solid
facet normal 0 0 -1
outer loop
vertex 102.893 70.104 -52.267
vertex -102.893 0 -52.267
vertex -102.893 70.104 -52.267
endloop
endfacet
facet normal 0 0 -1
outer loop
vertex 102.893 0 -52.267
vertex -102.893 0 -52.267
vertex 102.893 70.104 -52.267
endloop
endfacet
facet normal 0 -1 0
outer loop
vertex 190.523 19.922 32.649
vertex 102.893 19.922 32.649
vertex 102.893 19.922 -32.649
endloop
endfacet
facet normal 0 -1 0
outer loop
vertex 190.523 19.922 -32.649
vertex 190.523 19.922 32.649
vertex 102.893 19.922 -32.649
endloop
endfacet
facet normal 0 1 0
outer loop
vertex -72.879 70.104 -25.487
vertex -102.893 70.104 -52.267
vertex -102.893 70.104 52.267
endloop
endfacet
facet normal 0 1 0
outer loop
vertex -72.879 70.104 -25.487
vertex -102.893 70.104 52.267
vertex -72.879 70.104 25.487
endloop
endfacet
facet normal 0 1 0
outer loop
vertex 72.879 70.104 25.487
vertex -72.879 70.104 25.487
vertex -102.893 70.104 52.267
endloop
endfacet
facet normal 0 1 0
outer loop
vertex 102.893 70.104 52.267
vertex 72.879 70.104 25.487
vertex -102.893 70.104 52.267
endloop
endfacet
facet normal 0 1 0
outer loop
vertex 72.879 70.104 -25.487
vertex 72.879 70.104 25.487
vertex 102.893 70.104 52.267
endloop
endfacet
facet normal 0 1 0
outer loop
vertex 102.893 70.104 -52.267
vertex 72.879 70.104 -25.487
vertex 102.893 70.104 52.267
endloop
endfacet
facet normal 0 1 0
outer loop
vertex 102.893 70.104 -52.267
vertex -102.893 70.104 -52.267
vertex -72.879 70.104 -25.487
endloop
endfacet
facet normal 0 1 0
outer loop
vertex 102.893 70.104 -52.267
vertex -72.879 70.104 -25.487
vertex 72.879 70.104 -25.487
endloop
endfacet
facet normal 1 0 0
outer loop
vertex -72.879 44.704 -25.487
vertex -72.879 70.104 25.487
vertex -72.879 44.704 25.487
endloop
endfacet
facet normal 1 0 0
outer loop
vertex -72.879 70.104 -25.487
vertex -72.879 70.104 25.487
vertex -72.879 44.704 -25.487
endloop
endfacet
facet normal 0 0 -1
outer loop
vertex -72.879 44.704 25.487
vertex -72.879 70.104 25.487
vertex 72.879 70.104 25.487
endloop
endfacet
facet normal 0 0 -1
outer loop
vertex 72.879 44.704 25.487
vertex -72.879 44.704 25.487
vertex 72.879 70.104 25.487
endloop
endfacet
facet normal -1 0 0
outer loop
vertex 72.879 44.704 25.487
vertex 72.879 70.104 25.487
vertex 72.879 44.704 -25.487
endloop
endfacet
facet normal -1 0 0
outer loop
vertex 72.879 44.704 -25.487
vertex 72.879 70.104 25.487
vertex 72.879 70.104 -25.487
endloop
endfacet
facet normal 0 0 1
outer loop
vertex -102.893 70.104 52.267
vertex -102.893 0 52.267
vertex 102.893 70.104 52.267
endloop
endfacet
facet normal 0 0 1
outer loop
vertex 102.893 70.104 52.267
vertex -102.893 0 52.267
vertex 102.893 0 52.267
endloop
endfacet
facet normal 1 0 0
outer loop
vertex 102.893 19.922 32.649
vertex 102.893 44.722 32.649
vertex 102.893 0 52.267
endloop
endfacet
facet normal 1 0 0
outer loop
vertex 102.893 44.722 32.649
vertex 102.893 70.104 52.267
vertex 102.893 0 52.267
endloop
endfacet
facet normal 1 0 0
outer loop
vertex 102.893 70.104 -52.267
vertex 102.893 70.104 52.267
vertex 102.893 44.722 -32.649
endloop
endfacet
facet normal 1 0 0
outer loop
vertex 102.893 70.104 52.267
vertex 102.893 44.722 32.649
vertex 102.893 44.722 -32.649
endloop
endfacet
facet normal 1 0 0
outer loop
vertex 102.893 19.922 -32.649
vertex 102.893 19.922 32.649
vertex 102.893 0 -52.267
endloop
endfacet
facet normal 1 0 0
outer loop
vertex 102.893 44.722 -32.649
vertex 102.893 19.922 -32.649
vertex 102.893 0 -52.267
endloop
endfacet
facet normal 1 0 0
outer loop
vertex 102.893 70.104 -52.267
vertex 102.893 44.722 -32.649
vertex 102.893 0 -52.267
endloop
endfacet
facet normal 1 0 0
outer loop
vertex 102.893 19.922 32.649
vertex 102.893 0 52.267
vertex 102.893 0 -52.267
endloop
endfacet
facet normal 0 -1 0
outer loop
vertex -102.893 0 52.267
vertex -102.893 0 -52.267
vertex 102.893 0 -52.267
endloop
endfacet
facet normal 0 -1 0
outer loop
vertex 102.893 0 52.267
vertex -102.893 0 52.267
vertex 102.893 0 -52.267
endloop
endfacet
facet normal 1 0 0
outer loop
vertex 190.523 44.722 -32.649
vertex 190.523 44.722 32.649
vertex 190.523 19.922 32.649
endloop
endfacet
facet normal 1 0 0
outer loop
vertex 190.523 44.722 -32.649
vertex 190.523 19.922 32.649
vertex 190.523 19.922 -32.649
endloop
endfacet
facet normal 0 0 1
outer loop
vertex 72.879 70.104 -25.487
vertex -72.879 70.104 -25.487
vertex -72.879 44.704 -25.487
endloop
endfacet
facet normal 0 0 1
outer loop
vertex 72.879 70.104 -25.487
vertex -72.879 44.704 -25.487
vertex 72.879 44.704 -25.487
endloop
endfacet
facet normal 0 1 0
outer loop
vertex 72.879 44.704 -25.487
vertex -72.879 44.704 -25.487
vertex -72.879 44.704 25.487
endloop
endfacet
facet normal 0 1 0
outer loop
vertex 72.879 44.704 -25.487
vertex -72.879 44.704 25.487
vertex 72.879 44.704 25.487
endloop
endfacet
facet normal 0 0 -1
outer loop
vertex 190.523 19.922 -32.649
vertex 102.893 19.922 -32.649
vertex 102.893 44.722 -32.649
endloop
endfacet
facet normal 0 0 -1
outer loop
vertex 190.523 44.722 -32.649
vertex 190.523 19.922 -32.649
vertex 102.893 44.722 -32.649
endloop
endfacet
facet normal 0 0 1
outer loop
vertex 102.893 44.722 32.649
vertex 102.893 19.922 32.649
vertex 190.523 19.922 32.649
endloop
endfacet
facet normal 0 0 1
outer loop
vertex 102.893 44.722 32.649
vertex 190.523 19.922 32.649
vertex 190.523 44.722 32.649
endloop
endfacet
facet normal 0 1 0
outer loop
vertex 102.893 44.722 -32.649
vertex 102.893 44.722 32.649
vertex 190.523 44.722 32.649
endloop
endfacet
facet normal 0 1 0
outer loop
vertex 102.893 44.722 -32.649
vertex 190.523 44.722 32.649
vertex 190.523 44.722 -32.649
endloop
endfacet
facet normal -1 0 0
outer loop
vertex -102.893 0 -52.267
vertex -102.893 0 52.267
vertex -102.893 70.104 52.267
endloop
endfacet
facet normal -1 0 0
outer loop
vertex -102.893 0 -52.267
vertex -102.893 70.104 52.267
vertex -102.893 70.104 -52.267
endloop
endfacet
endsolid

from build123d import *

# Parameters (mm, degrees)
SKETCH1_W           = 205.785682804
SKETCH1_H           = 104.534748446
BOSS_EXTRUDE1_DEPTH = 70.104
SKETCH2_W           = 145.758865666
SKETCH2_H           = 50.974097726
CUT_EXTRUDE1_DEPTH  = 25.4
SKETCH3_W           = 65.29816474
SKETCH3_H           = 24.799651417
BOSS_EXTRUDE2_DEPTH = 87.63


with BuildPart() as part:
    # Sketch1 → Boss-Extrude1 (new body)
    with BuildSketch(Plane(origin=(0, 0, 0), x_dir=(1, 0, 0), z_dir=(0, 1, 0))):
        Rectangle(SKETCH1_W, SKETCH1_H)
    extrude(amount=BOSS_EXTRUDE1_DEPTH)

    # Sketch2 → Cut-Extrude1 (cut)
    with BuildSketch(Plane(origin=(0, 70.104, 0), x_dir=(1, 0, 0), z_dir=(0, 1, 0))):
        Rectangle(SKETCH2_W, SKETCH2_H)
    extrude(amount=-CUT_EXTRUDE1_DEPTH, mode=Mode.SUBTRACT)

    # Sketch3 → Boss-Extrude2 (add)
    with BuildSketch(Plane(origin=(102.892841402, 0, 0), x_dir=(0, 0, -1), z_dir=(1, 0, 0))):
        with Locations((0, 32.321763147)):
            Rectangle(SKETCH3_W, SKETCH3_H)
    extrude(amount=BOSS_EXTRUDE2_DEPTH)


solid = part.part
